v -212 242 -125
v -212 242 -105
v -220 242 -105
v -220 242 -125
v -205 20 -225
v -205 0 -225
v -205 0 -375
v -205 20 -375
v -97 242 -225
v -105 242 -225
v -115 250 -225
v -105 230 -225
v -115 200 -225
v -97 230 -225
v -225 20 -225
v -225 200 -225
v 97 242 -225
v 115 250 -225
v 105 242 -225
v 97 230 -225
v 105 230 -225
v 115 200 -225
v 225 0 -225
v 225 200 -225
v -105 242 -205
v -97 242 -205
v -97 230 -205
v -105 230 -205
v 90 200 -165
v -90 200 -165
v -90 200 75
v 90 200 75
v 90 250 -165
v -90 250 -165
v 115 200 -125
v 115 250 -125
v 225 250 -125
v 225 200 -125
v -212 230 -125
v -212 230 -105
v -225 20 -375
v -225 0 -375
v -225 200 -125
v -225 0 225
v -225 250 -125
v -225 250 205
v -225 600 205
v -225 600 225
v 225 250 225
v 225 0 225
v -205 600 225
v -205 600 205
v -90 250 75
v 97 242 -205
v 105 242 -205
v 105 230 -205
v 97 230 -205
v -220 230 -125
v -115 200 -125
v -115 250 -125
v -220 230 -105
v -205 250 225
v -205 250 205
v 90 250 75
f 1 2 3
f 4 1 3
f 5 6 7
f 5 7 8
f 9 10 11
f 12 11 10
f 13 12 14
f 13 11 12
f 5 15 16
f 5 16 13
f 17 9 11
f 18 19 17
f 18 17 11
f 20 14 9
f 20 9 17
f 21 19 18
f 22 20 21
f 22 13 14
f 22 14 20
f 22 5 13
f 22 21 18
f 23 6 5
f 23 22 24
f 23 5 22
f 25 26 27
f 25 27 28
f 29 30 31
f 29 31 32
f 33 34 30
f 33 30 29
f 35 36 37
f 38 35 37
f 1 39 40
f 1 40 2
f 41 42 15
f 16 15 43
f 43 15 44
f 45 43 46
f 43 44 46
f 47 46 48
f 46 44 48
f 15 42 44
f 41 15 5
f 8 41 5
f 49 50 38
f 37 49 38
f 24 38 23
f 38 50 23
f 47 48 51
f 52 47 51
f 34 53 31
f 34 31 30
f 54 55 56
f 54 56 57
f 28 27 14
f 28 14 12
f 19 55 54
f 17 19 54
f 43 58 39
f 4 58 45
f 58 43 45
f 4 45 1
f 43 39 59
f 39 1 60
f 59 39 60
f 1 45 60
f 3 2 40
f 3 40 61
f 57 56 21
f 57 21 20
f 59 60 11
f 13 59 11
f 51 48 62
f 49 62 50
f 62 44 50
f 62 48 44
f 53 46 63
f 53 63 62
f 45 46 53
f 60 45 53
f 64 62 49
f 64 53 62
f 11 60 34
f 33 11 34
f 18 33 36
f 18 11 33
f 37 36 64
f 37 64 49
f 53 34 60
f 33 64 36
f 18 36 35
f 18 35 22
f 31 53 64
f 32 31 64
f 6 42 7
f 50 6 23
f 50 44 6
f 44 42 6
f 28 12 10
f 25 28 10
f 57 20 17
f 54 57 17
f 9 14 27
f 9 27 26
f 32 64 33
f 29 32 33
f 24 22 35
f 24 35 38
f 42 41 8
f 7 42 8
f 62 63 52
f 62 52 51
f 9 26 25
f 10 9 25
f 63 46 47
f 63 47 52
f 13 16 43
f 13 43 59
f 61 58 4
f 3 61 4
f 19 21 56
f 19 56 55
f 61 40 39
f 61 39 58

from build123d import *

# Parameters (mm, degrees)
SKETCH_1_W          = 450
SKETCH_1_H          = 450
EXTRUDE_1_DEPTH     = 250
SKETCH_2_W          = 180
SKETCH_2_H          = 240
CUT_EXTRUDE_1_DEPTH = 50
SKETCH_3_W          = 110
SKETCH_3_H          = 100
CUT_EXTRUDE_2_DEPTH = 50
SKETCH_4_W          = 8
SKETCH_4_H          = 12
CUT_EXTRUDE_3_DEPTH = 20
SKETCH_5_W          = 8
SKETCH_5_H          = 12
CUT_EXTRUDE_4_DEPTH = 20
SKETCH_6_W          = 20
SKETCH_6_H          = 20
EXTRUDE_2_DEPTH     = 600
SKETCH_7_W          = 20
SKETCH_7_H          = 20
EXTRUDE_3_DEPTH     = 600


with BuildPart() as part:
    # 草图1 → 凸台-拉伸1 (new body)
    with BuildSketch(Plane(origin=(0, 0, 0), x_dir=(1, 0, 0), z_dir=(0, 1, 0))):
        Rectangle(SKETCH_1_W, SKETCH_1_H)
    extrude(amount=EXTRUDE_1_DEPTH)

    # 草图2 → 切除-拉伸1 (cut)
    with BuildSketch(Plane(origin=(0, 250, 0), x_dir=(1, 0, 0), z_dir=(0, 1, 0))):
        with Locations((0, 45)):
            Rectangle(SKETCH_2_W, SKETCH_2_H)
    extrude(amount=-CUT_EXTRUDE_1_DEPTH, mode=Mode.SUBTRACT)

    # 草图3 → 切除-拉伸2 (cut)
    with BuildSketch(Plane(origin=(0, 250, 0), x_dir=(1, 0, 0), z_dir=(0, 1, 0))):
        with Locations((-170, 175)):
            Rectangle(SKETCH_3_W, SKETCH_3_H)
        with Locations((170, 175)):
            Rectangle(SKETCH_3_W, SKETCH_3_H)
    extrude(amount=-CUT_EXTRUDE_2_DEPTH, mode=Mode.SUBTRACT)

    # 草图4 → 切除-拉伸3 (cut)
    with BuildSketch(Plane(origin=(0, 0, -225), x_dir=(-1, 0, 0), z_dir=(0, 0, -1))):
        with Locations((-101, 236)):
            Rectangle(SKETCH_4_W, SKETCH_4_H)
        with Locations((101, 236)):
            Rectangle(SKETCH_4_W, SKETCH_4_H)
    extrude(amount=-CUT_EXTRUDE_3_DEPTH, mode=Mode.SUBTRACT)

    # 草图5 → 切除-拉伸4 (cut)
    with BuildSketch(Plane(origin=(0, 0, -125), x_dir=(-1, 0, 0), z_dir=(0, 0, -1))):
        with Locations((216, 236)):
            Rectangle(SKETCH_5_W, SKETCH_5_H)
    extrude(amount=-CUT_EXTRUDE_4_DEPTH, mode=Mode.SUBTRACT)

    # 草图6 → 凸台-拉伸2 (add)
    with BuildSketch(Plane.XZ):
        with Locations((-215, 215)):
            Rectangle(SKETCH_6_W, SKETCH_6_H)
    extrude(amount=-EXTRUDE_2_DEPTH)

    # 草图7 → 凸台-拉伸3 (add)
    with BuildSketch(Plane.XY.offset(225)):
        with Locations((-215, 10)):
            Rectangle(SKETCH_7_W, SKETCH_7_H)
    extrude(amount=-EXTRUDE_3_DEPTH)


solid = part.part
